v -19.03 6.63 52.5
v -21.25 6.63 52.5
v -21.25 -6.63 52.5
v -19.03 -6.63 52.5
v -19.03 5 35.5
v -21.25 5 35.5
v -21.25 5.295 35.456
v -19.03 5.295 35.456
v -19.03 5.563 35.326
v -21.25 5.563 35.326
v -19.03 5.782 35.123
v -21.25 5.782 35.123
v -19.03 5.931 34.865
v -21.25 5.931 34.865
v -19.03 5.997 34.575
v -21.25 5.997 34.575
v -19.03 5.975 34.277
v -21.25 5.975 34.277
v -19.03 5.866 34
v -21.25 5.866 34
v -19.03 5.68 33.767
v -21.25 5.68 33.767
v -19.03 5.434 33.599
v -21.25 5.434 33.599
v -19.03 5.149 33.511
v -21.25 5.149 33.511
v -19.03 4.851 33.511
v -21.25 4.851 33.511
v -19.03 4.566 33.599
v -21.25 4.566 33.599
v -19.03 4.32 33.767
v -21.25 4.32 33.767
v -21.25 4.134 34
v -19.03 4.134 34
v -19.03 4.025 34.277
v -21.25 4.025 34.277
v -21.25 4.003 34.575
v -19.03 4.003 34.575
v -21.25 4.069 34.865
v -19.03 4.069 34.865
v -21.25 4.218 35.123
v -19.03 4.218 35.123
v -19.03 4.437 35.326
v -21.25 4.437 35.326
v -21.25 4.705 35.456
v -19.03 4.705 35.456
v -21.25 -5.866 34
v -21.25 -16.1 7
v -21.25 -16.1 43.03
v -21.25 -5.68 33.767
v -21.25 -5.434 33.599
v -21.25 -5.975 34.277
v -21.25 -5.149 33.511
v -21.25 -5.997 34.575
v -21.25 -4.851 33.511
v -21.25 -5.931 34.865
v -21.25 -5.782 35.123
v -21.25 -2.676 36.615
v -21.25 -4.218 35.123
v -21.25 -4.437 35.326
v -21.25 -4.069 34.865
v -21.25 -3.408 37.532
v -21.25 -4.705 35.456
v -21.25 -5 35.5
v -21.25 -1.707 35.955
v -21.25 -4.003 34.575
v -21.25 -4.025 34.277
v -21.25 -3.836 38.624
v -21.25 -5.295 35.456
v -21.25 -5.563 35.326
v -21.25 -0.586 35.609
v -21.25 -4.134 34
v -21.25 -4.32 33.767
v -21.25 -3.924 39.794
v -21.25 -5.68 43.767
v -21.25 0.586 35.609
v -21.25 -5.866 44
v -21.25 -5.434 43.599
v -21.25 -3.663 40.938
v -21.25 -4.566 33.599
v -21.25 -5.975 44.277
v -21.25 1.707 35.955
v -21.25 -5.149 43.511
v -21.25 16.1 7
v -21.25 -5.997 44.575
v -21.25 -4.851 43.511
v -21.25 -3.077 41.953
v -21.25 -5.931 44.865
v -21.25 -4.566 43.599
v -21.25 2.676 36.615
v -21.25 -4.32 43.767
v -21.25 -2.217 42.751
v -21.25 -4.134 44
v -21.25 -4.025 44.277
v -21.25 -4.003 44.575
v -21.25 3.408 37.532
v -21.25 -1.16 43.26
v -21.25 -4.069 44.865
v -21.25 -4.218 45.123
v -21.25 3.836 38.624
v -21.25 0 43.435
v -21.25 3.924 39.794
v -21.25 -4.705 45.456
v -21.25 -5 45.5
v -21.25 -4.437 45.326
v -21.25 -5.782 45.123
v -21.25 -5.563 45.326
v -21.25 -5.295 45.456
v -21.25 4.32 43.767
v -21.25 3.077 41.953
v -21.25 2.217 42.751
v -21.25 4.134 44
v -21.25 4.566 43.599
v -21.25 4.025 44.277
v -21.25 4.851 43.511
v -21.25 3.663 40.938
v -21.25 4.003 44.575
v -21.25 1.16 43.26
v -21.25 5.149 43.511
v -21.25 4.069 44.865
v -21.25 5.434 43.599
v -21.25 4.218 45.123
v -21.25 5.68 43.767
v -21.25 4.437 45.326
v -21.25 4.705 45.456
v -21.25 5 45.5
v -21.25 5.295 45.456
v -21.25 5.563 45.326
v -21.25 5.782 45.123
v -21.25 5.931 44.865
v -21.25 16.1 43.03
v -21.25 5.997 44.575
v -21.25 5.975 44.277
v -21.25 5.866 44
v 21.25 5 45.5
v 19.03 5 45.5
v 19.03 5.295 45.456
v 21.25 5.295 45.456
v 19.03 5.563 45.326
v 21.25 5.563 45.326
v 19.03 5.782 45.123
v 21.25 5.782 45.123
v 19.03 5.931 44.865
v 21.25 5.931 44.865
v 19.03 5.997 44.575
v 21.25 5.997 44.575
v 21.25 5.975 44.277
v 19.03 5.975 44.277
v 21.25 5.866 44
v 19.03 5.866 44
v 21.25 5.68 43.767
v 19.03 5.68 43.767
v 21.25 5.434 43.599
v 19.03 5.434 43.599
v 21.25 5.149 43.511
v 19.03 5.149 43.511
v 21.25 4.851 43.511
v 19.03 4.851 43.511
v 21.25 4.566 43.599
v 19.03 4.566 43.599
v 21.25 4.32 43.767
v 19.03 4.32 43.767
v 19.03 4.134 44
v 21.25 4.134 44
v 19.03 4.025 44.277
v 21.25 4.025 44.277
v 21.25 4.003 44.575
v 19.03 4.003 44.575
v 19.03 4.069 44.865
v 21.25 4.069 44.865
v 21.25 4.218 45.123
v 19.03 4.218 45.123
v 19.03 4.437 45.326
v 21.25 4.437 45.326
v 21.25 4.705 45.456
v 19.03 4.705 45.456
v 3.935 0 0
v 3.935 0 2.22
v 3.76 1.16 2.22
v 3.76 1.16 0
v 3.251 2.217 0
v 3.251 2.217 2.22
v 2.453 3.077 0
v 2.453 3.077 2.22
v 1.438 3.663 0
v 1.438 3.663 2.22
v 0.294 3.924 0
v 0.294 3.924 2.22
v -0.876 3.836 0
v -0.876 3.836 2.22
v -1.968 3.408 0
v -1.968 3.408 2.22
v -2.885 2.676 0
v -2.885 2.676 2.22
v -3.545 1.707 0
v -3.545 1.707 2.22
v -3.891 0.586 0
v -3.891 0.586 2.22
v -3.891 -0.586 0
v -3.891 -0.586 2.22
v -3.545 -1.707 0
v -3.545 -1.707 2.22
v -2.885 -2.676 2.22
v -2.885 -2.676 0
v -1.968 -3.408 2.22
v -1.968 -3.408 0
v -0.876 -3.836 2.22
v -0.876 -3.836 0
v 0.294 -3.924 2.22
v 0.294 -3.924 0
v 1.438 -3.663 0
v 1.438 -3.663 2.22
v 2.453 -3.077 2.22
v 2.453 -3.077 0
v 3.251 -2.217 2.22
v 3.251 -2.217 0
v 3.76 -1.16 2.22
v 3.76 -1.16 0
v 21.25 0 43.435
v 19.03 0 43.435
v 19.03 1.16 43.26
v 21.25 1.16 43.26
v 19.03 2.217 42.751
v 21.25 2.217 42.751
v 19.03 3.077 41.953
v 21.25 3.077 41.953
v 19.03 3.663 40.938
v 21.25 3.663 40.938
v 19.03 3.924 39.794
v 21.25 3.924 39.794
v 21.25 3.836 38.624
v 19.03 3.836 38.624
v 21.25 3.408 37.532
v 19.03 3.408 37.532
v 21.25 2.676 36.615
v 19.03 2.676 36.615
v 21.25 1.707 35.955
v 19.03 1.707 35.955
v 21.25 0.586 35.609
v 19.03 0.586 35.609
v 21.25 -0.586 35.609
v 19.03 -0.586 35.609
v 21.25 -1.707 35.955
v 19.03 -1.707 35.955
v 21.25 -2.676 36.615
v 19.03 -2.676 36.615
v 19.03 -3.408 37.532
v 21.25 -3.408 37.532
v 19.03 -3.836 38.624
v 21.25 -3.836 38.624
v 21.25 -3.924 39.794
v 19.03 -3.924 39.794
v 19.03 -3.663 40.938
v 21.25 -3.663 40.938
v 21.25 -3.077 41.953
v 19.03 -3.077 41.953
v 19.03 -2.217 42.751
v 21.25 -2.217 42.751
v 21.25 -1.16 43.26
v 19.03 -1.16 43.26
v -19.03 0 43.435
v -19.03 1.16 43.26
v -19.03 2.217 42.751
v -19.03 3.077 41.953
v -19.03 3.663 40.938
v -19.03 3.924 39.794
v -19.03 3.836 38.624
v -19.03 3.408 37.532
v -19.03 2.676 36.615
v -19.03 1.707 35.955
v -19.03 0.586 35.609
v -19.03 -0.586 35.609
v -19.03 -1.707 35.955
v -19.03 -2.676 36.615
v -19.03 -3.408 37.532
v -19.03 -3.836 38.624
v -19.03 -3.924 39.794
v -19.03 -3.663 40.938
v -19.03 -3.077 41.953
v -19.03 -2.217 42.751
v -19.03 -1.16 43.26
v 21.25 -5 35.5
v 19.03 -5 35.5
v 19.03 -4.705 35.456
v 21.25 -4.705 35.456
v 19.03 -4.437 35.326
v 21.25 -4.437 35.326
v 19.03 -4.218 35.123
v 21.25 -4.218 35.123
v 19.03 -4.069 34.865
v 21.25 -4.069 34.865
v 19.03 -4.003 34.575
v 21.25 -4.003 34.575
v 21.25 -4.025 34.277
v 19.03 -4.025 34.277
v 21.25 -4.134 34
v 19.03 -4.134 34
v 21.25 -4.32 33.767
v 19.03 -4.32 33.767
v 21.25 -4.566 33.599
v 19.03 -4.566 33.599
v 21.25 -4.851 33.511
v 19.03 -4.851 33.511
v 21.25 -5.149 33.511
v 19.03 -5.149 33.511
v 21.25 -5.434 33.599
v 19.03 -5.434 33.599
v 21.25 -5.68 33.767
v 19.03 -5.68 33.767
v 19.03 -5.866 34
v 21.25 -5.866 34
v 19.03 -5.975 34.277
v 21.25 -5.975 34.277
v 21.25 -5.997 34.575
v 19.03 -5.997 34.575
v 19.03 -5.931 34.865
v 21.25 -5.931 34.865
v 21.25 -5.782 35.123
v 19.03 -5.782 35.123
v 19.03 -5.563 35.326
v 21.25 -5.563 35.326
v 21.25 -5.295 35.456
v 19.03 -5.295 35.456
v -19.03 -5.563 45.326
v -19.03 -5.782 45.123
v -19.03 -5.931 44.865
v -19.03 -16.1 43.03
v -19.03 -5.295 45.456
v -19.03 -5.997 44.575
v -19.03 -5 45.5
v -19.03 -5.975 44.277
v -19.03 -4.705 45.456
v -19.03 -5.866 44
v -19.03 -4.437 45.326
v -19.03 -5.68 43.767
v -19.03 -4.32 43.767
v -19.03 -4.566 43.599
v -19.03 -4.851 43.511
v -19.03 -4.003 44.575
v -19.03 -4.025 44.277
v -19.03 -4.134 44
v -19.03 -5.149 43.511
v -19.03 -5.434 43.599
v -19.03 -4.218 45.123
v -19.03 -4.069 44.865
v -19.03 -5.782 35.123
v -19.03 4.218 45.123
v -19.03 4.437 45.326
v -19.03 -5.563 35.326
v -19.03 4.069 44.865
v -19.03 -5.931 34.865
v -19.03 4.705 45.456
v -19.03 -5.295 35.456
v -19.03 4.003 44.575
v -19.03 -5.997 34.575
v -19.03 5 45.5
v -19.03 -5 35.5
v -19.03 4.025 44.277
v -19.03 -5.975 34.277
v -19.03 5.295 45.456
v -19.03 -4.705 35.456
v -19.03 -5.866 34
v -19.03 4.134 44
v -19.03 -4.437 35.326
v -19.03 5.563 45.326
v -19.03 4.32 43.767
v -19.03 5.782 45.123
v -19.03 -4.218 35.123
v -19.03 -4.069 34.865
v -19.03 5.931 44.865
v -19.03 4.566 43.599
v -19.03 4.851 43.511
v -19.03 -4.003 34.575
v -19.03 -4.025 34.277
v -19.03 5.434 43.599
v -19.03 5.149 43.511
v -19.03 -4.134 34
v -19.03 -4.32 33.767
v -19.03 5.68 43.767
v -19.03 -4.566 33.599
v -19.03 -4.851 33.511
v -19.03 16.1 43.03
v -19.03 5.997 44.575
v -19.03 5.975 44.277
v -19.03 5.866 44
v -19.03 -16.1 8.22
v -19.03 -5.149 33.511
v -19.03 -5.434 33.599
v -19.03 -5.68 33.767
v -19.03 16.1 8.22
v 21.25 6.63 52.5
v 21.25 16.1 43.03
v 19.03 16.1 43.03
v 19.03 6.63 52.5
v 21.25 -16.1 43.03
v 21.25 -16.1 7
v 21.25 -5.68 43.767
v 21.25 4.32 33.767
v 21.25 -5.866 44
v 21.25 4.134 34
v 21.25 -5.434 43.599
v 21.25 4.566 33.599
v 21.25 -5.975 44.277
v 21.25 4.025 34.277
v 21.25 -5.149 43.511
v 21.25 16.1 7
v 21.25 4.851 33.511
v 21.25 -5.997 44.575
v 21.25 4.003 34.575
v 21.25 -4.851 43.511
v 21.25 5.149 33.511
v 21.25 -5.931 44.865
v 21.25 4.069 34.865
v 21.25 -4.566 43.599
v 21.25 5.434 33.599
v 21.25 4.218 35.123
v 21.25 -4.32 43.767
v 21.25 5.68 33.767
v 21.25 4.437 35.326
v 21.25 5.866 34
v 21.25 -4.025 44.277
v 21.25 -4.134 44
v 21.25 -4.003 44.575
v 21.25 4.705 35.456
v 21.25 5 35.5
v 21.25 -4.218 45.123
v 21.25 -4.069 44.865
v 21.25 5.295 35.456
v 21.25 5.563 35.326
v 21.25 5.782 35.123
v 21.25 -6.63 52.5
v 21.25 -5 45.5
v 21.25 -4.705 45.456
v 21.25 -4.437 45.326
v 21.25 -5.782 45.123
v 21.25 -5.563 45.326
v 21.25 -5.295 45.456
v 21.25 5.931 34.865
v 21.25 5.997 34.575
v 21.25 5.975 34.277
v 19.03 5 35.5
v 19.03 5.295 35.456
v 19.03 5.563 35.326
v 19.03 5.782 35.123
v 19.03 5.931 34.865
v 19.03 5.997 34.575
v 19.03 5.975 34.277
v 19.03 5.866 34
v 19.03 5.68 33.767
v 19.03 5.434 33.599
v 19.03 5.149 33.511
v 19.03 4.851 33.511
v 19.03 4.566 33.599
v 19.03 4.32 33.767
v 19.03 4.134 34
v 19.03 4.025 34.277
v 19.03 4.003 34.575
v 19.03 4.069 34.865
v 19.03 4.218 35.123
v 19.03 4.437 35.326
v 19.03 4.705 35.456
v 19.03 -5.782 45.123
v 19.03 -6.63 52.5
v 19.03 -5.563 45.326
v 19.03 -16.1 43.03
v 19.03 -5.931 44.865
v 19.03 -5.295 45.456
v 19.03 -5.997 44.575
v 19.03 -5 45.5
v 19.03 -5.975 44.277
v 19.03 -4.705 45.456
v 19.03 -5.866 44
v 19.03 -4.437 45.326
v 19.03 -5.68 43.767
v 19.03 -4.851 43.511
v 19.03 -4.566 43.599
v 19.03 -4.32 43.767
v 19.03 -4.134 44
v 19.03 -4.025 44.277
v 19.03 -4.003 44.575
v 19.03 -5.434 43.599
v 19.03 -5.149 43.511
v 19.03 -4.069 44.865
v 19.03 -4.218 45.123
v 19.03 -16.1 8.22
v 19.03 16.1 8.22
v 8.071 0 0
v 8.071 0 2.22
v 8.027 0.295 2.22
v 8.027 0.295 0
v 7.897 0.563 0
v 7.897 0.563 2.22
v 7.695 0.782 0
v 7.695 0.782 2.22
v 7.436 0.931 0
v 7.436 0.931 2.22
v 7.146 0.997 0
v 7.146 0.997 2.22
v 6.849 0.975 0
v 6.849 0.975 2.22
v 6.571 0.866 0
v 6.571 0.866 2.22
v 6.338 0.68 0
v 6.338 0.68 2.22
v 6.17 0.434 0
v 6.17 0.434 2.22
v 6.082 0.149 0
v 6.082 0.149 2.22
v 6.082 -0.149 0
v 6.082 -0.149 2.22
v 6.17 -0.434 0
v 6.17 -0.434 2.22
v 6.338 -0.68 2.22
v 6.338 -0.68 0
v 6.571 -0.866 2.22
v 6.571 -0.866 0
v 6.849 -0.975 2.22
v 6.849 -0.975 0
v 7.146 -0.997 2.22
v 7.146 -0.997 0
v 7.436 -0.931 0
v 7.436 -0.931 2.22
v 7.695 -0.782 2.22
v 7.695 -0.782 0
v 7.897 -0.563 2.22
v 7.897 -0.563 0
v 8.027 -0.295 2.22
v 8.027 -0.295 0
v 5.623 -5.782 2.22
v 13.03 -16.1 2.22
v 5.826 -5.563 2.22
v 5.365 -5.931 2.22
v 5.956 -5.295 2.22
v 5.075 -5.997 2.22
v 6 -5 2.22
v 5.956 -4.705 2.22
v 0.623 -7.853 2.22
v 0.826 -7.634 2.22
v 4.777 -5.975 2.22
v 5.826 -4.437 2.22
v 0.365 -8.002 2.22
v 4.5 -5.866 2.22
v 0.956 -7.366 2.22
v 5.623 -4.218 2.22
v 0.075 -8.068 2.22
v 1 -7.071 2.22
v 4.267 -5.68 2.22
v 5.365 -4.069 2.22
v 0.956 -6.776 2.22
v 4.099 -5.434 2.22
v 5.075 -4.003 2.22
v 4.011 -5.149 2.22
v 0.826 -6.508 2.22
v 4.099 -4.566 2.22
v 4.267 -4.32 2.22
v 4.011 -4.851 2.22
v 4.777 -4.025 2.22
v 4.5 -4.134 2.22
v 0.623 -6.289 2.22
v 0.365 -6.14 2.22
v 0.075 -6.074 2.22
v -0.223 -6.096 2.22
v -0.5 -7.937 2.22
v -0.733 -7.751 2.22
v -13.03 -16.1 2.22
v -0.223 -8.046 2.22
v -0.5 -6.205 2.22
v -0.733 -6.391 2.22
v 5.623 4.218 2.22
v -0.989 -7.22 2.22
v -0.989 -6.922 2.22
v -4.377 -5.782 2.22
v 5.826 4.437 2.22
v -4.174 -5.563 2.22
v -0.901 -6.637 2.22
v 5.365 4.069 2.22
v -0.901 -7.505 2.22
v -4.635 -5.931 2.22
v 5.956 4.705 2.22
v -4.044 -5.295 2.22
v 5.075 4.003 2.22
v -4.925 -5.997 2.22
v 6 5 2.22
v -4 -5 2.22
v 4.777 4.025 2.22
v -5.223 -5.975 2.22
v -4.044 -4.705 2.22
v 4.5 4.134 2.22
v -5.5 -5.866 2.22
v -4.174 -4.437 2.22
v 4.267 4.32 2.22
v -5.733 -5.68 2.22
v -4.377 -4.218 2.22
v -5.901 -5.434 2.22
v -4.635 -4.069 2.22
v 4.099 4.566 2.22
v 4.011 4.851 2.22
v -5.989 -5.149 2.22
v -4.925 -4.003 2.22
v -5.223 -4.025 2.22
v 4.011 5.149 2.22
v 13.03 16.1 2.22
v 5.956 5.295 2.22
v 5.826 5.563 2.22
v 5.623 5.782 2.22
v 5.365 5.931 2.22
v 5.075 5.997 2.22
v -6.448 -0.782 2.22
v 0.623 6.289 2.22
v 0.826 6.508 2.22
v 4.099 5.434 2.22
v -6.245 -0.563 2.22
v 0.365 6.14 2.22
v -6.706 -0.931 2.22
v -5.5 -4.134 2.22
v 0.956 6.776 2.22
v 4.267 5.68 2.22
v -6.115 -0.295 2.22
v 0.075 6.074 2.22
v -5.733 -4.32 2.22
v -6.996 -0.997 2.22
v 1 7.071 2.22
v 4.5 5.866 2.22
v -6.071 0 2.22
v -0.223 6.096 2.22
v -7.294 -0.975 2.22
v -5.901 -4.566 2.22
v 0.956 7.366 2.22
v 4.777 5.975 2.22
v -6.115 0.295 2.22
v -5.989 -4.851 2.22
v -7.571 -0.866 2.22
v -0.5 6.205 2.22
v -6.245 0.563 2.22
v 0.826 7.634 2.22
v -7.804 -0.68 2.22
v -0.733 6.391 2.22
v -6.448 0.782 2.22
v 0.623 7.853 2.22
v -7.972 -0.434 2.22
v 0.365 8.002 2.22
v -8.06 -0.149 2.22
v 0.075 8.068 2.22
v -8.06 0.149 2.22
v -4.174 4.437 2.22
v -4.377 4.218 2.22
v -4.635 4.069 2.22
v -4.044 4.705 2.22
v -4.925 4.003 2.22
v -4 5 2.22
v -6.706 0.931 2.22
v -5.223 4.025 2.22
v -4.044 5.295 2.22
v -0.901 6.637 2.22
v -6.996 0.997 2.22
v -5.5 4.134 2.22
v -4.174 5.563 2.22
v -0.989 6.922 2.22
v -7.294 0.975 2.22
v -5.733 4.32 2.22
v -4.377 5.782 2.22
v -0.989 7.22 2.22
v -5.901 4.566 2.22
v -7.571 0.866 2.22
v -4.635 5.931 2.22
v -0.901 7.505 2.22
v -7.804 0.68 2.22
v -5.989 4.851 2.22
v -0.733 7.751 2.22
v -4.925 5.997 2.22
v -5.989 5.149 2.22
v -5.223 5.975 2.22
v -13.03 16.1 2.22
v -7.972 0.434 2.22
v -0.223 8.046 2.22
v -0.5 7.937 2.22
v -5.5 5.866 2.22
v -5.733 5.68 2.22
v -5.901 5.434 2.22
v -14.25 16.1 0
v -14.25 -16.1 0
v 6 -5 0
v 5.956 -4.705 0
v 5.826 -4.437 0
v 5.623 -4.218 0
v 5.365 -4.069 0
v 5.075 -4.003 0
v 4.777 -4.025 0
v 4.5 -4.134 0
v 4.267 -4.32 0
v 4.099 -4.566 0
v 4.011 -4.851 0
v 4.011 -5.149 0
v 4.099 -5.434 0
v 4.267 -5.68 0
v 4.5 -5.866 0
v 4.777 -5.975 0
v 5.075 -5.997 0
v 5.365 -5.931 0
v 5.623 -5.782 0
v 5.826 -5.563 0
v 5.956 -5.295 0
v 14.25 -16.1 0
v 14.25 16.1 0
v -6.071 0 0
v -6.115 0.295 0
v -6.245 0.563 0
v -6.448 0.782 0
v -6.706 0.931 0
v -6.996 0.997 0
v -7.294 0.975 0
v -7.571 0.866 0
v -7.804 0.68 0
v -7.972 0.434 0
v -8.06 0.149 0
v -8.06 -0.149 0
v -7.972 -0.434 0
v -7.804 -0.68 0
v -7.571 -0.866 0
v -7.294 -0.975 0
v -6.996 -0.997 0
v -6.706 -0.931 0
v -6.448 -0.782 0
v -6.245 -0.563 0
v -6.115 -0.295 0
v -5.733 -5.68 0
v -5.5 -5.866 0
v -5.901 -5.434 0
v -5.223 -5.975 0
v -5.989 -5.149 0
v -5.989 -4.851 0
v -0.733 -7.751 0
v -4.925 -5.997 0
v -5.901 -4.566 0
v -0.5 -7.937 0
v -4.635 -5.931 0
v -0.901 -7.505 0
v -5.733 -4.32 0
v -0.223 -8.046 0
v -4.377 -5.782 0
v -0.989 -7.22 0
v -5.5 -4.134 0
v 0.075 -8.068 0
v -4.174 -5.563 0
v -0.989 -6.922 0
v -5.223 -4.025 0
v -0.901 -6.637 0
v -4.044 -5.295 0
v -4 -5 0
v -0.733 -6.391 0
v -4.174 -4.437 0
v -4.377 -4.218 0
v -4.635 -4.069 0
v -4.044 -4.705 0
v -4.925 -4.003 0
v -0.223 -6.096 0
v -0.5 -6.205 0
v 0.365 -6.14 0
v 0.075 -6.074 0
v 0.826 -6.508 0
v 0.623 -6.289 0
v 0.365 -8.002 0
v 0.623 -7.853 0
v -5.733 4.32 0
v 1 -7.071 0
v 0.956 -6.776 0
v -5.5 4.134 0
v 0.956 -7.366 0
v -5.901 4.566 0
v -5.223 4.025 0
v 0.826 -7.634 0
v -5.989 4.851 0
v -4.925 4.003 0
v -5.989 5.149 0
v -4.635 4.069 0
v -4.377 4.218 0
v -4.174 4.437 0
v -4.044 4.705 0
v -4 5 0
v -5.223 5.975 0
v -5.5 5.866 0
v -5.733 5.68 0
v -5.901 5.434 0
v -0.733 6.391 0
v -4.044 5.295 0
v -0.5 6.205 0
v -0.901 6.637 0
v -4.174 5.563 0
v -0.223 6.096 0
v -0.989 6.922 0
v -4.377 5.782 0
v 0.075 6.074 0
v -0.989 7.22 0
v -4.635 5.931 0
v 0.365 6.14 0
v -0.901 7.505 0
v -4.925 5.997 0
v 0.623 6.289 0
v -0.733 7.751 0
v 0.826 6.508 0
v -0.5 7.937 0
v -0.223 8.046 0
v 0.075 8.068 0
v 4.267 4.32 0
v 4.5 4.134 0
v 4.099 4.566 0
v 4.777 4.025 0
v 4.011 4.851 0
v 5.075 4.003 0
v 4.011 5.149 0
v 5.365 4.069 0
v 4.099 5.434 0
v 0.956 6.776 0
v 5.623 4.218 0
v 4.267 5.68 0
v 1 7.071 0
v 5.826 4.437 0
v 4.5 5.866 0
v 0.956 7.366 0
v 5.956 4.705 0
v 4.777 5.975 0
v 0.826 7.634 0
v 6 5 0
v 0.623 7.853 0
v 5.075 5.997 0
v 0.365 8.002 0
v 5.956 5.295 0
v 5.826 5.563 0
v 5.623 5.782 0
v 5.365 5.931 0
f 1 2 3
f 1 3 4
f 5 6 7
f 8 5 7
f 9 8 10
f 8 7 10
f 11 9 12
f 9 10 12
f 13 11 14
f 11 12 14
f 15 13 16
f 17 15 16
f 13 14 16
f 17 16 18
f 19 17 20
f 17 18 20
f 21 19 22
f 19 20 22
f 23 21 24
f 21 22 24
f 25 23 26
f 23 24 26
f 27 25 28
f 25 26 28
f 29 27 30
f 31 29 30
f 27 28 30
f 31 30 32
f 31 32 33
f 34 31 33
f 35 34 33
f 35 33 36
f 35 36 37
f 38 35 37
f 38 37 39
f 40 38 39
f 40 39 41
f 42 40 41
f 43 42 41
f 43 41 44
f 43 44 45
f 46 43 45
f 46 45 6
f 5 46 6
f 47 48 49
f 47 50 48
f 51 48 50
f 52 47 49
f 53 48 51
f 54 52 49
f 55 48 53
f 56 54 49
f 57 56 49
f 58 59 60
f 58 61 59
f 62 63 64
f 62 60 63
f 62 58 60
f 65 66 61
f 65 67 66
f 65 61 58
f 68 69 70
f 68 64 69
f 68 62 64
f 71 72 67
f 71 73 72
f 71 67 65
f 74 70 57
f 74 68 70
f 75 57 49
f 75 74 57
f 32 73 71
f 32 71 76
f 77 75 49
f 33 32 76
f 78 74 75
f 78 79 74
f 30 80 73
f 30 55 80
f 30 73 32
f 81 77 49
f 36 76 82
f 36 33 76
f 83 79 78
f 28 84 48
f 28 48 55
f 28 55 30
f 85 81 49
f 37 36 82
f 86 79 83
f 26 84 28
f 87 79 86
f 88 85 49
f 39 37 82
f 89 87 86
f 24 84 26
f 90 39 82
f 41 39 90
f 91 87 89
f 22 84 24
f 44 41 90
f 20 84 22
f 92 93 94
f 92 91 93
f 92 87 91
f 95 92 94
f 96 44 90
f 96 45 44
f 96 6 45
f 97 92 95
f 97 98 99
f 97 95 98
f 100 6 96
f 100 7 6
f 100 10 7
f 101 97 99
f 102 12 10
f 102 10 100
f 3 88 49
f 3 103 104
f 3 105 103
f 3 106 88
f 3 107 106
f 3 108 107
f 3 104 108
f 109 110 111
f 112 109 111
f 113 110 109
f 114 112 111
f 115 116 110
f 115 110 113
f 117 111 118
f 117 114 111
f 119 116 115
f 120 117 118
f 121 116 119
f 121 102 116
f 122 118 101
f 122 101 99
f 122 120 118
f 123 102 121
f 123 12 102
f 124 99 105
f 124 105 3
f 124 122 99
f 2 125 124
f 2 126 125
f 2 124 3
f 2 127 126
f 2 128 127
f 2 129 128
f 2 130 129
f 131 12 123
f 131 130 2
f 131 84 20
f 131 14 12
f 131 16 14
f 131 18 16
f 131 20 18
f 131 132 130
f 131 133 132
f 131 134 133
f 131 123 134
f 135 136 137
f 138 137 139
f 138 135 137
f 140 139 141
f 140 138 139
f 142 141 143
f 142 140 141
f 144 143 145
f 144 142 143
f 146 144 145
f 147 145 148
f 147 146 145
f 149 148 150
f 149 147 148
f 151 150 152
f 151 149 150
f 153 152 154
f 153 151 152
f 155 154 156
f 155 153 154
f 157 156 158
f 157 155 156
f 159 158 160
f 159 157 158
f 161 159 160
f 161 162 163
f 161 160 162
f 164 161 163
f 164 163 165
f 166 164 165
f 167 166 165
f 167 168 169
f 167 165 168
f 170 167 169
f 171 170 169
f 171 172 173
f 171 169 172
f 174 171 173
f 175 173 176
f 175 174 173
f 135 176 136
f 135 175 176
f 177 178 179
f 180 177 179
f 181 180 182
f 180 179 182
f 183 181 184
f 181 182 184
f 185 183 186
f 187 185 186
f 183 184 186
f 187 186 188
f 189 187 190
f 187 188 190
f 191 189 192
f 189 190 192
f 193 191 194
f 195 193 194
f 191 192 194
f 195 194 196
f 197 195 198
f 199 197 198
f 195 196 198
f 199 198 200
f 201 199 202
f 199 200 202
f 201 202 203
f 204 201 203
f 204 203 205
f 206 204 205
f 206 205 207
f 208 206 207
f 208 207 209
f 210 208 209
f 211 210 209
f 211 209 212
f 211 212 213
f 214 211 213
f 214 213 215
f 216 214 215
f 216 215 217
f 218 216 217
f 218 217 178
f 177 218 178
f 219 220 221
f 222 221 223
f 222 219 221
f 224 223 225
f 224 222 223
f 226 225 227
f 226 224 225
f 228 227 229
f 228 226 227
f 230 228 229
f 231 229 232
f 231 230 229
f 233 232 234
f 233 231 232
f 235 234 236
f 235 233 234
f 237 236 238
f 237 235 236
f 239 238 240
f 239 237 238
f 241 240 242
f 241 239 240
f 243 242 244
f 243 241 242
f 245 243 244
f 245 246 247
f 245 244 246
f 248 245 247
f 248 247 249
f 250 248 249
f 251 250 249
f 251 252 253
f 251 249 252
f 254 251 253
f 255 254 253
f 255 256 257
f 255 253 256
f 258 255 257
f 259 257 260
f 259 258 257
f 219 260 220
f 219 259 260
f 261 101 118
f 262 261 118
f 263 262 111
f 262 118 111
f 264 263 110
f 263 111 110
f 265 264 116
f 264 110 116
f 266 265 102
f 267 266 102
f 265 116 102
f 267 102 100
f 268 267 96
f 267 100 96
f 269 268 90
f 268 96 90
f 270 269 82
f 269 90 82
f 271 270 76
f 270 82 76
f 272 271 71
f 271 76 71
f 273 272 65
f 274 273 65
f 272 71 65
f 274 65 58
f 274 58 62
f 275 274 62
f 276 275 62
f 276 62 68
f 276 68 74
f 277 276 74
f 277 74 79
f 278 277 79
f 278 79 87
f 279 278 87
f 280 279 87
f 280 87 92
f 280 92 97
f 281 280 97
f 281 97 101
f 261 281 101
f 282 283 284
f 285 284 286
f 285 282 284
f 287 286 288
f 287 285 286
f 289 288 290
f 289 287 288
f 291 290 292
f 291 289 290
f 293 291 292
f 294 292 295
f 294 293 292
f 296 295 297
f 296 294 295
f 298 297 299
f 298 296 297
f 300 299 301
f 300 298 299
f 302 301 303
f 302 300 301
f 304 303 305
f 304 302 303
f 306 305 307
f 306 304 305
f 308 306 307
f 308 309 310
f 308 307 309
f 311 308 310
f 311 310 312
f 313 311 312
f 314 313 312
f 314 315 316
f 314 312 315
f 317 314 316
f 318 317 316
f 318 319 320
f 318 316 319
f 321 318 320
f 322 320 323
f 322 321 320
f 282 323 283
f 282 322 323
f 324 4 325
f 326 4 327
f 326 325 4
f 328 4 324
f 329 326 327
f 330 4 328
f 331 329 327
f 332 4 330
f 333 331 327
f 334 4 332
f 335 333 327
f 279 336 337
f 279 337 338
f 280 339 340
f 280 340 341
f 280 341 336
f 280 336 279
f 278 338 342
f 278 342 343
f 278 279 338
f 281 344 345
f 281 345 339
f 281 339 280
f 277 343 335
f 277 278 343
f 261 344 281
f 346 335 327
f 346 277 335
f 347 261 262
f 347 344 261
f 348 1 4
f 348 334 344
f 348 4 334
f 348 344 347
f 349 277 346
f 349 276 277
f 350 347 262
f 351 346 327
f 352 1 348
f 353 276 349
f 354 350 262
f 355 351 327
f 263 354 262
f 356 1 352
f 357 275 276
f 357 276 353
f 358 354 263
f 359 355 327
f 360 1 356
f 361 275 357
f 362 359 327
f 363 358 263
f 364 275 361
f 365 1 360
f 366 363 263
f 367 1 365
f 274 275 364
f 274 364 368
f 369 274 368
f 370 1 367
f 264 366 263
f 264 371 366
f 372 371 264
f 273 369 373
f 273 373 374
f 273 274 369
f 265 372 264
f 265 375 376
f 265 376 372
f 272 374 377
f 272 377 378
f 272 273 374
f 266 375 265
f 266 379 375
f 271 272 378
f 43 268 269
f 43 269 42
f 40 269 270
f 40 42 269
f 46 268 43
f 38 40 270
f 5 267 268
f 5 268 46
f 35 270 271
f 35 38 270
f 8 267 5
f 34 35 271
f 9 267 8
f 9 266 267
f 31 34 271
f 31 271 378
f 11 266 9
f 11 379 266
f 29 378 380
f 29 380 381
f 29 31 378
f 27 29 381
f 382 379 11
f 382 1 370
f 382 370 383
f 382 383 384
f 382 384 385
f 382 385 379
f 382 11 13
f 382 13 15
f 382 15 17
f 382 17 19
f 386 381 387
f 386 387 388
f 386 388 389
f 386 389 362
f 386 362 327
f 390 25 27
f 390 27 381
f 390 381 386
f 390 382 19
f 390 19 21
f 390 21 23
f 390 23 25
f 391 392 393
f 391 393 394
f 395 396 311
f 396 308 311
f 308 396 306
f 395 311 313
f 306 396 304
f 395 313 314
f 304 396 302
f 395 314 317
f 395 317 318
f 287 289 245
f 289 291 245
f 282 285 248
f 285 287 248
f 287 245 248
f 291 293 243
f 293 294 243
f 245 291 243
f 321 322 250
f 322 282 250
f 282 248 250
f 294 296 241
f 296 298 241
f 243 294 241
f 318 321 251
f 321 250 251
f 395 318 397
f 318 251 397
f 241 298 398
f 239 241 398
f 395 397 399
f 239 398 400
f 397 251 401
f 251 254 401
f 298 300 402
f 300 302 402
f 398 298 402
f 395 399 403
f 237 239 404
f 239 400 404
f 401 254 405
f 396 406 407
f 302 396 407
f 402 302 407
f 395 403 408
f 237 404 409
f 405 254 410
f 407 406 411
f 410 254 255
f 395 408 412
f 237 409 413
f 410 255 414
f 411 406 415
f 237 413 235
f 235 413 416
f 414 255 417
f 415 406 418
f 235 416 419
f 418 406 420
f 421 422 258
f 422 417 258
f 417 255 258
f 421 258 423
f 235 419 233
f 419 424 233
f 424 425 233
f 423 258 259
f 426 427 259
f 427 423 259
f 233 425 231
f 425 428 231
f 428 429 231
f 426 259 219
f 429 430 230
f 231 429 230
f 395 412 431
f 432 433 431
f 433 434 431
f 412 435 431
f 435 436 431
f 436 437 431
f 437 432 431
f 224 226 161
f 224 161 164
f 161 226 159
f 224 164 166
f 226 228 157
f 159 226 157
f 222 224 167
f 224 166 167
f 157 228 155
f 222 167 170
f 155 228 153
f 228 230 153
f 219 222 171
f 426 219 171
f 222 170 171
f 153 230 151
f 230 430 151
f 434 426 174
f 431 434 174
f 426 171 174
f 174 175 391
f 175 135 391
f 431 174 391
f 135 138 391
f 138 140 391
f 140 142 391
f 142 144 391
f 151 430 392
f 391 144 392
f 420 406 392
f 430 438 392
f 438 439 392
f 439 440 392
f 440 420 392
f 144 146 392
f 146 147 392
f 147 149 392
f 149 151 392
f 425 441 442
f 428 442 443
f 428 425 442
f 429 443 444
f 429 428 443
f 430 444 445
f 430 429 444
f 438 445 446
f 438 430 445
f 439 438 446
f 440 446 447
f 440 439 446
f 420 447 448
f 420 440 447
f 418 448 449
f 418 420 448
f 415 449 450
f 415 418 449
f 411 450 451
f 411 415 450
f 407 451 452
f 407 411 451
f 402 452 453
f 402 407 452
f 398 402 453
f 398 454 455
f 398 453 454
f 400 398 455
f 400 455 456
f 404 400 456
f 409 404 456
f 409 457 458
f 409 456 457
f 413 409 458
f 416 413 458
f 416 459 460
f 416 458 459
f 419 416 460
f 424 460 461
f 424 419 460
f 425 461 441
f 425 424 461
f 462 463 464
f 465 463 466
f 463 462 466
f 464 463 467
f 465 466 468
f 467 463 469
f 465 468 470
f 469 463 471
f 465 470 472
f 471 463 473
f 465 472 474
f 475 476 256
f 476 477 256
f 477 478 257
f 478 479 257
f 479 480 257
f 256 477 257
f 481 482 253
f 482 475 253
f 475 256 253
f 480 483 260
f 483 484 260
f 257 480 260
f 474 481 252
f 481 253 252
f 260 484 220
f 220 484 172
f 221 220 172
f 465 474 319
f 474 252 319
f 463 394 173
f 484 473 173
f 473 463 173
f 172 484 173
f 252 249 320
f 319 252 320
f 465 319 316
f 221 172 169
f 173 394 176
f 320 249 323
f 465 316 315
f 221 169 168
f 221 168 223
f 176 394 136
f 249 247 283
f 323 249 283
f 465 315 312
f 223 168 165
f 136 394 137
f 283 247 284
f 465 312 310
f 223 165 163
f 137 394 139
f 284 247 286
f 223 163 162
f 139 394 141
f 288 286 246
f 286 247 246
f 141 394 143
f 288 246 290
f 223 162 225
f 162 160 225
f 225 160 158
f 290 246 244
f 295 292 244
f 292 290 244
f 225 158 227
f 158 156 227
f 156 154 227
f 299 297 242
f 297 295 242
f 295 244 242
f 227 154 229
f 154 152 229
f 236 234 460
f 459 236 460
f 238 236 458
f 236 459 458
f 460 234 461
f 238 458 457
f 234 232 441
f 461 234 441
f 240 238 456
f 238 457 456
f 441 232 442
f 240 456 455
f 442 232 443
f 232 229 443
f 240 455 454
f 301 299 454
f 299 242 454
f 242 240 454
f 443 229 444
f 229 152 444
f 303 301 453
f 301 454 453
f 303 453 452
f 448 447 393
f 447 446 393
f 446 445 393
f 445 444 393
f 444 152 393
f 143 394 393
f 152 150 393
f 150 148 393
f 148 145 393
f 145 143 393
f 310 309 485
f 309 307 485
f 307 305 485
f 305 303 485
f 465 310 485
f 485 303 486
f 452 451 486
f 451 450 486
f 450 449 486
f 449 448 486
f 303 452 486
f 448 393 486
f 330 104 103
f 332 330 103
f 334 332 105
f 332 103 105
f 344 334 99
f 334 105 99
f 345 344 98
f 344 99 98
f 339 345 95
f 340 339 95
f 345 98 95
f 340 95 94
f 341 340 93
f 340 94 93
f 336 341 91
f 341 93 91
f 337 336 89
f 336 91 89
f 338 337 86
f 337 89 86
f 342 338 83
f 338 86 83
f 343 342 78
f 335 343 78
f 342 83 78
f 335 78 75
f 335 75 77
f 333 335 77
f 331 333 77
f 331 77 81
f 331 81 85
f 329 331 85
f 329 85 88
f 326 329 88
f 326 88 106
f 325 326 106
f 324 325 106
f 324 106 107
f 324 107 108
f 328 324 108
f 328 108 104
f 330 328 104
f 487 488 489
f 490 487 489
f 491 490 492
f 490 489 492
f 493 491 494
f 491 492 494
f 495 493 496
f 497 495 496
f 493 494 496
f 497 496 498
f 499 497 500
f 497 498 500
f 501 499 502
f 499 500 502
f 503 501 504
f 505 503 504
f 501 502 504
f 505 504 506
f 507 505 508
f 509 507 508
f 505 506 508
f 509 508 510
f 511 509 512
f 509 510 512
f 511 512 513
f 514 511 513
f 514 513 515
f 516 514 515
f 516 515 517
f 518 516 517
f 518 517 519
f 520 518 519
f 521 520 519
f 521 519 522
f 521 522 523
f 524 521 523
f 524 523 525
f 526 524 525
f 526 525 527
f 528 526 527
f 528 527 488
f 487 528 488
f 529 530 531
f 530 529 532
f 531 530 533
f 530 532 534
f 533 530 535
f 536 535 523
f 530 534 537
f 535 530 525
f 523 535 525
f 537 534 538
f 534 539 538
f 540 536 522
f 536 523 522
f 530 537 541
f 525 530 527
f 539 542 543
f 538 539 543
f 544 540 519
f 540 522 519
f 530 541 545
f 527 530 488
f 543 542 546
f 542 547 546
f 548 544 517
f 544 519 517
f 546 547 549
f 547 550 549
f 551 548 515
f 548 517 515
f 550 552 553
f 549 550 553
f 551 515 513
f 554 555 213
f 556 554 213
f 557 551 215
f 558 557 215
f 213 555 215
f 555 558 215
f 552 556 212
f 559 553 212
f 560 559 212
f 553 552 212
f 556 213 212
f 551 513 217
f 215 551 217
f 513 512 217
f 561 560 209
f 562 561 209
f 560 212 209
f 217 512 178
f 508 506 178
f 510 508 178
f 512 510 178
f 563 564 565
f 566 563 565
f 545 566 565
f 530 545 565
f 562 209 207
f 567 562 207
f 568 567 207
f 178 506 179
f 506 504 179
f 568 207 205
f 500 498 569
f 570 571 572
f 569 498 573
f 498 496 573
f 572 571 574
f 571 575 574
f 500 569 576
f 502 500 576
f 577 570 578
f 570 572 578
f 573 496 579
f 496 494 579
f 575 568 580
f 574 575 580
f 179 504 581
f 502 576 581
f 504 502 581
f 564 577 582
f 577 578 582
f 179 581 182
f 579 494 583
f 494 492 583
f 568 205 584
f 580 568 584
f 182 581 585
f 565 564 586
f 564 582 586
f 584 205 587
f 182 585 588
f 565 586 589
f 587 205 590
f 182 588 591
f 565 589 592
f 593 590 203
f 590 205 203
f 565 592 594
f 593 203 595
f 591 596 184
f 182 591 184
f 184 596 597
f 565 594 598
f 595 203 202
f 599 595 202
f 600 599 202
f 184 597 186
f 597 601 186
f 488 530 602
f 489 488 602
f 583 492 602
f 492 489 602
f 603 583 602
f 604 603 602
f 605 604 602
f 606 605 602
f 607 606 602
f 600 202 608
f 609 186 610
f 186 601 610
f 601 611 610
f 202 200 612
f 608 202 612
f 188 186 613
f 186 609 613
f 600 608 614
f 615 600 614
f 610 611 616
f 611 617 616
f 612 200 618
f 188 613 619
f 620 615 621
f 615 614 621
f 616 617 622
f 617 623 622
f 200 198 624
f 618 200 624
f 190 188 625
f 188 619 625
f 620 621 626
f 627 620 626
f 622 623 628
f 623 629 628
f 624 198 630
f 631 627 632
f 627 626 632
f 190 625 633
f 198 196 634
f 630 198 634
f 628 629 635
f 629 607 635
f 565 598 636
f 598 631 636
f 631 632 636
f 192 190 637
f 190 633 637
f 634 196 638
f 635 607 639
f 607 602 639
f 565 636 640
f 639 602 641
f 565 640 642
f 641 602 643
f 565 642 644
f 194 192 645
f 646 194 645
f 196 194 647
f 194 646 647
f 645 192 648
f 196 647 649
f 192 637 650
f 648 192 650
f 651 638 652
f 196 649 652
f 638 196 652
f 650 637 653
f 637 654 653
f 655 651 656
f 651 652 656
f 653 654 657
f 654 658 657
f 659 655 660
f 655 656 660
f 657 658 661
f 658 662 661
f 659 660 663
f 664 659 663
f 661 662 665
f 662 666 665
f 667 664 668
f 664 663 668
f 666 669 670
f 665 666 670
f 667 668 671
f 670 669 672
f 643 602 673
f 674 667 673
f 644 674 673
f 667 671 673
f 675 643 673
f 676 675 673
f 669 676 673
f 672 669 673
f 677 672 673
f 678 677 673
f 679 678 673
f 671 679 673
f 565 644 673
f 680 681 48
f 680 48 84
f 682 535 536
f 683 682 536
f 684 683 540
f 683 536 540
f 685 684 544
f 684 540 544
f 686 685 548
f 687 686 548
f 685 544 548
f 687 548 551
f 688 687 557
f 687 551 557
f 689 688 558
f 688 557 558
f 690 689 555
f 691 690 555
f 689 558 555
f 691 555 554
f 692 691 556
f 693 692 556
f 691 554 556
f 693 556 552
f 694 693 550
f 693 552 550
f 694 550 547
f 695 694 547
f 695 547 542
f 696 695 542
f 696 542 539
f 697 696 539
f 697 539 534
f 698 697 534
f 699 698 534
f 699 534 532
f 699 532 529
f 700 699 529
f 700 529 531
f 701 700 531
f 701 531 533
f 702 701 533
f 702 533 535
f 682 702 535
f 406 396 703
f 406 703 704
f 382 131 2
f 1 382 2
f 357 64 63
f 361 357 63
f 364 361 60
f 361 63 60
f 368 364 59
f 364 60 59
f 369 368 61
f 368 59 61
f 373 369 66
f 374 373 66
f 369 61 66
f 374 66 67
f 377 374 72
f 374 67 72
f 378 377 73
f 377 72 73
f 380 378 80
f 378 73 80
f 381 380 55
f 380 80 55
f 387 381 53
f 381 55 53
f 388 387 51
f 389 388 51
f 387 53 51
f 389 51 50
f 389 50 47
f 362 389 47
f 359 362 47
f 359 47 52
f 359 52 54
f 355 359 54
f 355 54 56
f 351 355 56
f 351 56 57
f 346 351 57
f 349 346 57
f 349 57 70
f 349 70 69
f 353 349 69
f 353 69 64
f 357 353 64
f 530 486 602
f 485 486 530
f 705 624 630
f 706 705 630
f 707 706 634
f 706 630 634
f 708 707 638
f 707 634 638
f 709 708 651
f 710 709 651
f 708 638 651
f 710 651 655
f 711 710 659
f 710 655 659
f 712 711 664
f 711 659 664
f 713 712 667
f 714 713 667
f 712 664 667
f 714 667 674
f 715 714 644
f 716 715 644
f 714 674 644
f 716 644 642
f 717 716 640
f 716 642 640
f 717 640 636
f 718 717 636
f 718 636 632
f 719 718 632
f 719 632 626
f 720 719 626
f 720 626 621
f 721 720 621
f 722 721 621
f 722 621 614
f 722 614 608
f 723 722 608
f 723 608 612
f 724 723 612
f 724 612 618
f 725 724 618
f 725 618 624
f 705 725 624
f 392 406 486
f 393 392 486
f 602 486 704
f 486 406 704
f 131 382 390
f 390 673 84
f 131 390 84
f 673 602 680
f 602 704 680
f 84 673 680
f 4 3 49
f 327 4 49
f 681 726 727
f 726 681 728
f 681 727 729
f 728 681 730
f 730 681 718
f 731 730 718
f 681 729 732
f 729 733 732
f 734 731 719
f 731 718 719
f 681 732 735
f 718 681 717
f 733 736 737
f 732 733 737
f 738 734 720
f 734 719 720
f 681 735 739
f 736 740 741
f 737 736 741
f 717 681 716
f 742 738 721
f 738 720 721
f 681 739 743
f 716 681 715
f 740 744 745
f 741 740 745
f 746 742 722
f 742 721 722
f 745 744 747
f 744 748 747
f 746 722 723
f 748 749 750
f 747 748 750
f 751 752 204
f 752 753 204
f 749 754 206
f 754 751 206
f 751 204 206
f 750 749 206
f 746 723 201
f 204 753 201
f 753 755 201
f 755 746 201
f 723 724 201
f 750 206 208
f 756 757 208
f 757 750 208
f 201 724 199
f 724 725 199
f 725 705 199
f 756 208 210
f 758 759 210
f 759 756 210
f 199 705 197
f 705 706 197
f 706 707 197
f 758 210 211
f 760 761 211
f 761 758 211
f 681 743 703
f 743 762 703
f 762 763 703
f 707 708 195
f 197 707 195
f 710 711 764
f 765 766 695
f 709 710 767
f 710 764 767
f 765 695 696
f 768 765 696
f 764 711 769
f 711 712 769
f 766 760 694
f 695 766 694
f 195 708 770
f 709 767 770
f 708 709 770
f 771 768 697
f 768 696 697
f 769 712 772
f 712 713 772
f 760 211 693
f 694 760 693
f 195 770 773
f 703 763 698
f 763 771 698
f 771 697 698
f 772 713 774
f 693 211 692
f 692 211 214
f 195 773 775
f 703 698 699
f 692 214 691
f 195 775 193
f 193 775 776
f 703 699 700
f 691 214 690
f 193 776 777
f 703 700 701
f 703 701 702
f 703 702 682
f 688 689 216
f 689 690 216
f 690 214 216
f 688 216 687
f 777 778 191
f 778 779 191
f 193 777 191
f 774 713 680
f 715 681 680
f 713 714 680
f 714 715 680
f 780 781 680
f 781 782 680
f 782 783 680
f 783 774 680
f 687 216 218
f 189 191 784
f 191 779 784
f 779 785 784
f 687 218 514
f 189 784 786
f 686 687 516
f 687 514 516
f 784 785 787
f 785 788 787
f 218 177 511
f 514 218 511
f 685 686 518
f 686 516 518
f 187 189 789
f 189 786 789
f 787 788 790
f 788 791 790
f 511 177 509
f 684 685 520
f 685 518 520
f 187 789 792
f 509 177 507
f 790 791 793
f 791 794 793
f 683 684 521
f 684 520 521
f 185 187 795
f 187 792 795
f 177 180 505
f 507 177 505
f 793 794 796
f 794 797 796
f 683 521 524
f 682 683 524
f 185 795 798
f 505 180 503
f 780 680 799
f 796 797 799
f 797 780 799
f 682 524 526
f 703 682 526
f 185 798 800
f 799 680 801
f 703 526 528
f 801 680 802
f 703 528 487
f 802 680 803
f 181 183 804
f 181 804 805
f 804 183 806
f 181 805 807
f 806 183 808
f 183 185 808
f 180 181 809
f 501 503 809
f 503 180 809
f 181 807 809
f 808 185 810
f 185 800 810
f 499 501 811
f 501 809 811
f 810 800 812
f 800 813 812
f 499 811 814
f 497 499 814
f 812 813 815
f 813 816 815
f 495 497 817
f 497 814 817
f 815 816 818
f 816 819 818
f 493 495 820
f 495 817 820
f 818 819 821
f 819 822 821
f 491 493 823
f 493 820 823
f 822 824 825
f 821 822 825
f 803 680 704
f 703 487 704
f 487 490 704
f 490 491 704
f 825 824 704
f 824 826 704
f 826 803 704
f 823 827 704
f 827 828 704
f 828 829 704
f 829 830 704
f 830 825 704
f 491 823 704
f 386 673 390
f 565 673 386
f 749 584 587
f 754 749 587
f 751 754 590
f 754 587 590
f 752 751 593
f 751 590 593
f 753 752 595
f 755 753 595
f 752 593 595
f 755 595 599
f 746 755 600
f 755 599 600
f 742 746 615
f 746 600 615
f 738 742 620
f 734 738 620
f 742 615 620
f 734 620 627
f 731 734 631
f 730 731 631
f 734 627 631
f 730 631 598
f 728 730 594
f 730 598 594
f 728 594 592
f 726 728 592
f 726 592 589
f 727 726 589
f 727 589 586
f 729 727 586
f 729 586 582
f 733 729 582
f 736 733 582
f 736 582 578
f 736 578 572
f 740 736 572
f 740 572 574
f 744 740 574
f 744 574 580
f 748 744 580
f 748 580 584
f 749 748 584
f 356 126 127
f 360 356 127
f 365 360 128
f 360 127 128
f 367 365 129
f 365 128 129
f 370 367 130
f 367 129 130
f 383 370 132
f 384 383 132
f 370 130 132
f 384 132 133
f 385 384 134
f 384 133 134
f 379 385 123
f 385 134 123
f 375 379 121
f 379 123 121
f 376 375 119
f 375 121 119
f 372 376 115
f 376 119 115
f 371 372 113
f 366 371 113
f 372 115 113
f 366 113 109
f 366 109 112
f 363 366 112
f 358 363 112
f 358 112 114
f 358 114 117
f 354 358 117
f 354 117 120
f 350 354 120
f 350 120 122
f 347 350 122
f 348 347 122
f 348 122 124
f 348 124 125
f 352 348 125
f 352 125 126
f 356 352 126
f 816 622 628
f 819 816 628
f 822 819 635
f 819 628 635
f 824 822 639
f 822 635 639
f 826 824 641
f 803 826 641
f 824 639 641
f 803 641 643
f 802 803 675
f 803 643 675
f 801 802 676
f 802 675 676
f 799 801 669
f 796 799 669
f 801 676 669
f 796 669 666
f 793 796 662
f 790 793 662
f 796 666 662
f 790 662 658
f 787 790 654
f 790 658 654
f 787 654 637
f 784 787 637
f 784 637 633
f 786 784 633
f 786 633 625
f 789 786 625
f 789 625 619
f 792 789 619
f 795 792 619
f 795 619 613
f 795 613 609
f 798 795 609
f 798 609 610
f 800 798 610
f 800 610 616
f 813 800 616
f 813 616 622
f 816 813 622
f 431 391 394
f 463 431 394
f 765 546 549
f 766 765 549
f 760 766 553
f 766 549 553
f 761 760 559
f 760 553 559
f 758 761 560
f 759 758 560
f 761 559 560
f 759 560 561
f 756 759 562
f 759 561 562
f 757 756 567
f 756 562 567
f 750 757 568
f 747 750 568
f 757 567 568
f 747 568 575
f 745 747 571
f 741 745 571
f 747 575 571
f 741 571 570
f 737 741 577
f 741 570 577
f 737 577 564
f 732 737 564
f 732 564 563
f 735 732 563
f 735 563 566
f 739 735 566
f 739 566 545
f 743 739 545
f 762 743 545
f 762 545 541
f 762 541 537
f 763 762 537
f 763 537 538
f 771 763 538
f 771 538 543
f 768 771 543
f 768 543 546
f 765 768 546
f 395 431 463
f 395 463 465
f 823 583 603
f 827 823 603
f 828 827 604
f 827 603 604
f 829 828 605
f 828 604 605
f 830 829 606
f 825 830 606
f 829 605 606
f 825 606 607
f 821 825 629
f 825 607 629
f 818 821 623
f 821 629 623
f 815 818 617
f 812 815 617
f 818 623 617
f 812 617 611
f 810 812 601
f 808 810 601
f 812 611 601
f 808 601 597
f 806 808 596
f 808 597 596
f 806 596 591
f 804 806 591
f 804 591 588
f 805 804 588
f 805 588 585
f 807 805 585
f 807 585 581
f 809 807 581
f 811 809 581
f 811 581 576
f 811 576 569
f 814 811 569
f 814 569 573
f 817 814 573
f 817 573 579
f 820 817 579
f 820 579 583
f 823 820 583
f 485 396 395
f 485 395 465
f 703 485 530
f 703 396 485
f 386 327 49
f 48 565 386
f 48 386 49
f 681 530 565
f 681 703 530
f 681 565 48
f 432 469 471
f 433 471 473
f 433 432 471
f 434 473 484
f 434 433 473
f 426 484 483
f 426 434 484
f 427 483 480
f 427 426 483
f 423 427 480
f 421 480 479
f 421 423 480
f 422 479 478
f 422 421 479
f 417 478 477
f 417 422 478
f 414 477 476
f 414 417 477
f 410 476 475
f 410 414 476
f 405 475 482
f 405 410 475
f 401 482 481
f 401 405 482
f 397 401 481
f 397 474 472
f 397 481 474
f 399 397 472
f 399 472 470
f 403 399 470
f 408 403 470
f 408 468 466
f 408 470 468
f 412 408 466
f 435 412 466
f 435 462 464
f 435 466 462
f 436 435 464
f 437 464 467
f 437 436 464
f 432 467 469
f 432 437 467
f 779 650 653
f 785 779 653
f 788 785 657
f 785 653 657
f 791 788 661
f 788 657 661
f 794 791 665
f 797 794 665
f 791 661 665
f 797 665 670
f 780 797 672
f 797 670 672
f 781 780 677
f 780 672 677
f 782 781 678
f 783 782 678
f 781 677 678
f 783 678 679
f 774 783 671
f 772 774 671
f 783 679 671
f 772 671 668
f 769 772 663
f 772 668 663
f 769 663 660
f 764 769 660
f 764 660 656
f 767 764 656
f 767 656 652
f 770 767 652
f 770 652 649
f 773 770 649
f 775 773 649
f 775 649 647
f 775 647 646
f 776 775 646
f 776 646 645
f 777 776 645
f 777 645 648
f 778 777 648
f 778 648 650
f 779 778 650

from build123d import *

# Parameters (mm, degrees)
BOSS_EXTRUDE1_DEPTH = 16.1
CUT_EXTRUDE1_DEPTH  = 32.2
SKETCH3_R           = 3.935
SKETCH3_R_2         = 1
CUT_EXTRUDE2_DEPTH  = 32.2
SKETCH4_R           = 3.935
SKETCH4_R_2         = 1
CUT_EXTRUDE3_DEPTH  = 32.2
CHAMFER1_SIZE       = 6
CHAMFER2_SIZE       = 7


with BuildPart() as part:
    # Sketch1 → Boss-Extrude1 (new, symmetric)
    with BuildSketch(Plane(origin=(0, 0, 0), x_dir=(1, 0, 0), z_dir=(0, 1, 0))):
        Polygon((0, 0), (-21.25, 0), (-21.25, -52.5), (-19.03, -52.5), (-19.03, -2.22), (0, -2.22), align=None)
    boss_extrude1 = extrude(amount=BOSS_EXTRUDE1_DEPTH, both=True)

    # Sketch2 → Cut-Extrude1 (cut)
    with BuildSketch(Plane.ZY.offset(21.25)):
        Polygon((43.03, 16.1), (52.5, 6.63), (52.5, 16.1), align=None)
        Polygon((52.5, -6.63), (43.03, -16.1), (52.5, -16.1), align=None)
    cut_extrude1 = extrude(amount=-CUT_EXTRUDE1_DEPTH, mode=Mode.SUBTRACT)

    # Sketch3 → Cut-Extrude2 (cut)
    with BuildSketch(Plane.ZY.offset(21.25)):
        with Locations((39.5, 0)):
            Circle(SKETCH3_R)
        with Locations((34.5, 5)):
            Circle(SKETCH3_R_2)
        with Locations((44.5, 5)):
            Circle(SKETCH3_R_2)
        with Locations((44.5, -5)):
            Circle(SKETCH3_R_2)
        with Locations((34.5, -5)):
            Circle(SKETCH3_R_2)
    cut_extrude2 = extrude(amount=-CUT_EXTRUDE2_DEPTH, mode=Mode.SUBTRACT)

    # Mirror1: Boss-Extrude1, Cut-Extrude1, Cut-Extrude2 across plane
    add(boss_extrude1.mirror(Plane(origin=(0, 16.1, 2.22), x_dir=(0, 0, 1), z_dir=(-1, 0, 0))))
    add(cut_extrude1.mirror(Plane(origin=(0, 16.1, 2.22), x_dir=(0, 0, 1), z_dir=(-1, 0, 0))), mode=Mode.SUBTRACT)
    add(cut_extrude2.mirror(Plane(origin=(0, 16.1, 2.22), x_dir=(0, 0, 1), z_dir=(-1, 0, 0))), mode=Mode.SUBTRACT)

    # Sketch4 → Cut-Extrude3 (cut)
    with BuildSketch(Plane.XY.offset(2.22)):
        Circle(SKETCH4_R)
        with Locations((-5, 5)):
            Circle(SKETCH4_R_2)
        with Locations((5, 5)):
            Circle(SKETCH4_R_2)
        with Locations((5, -5)):
            Circle(SKETCH4_R_2)
        with Locations((-5, -5)):
            Circle(SKETCH4_R_2)
        with Locations((-7.071067812, 0)):
            Circle(SKETCH4_R_2)
        with Locations((0, 7.071067812)):
            Circle(SKETCH4_R_2)
        with Locations((7.071067812, 0)):
            Circle(SKETCH4_R_2)
        with Locations((0, -7.071067812)):
            Circle(SKETCH4_R_2)
    extrude(amount=-CUT_EXTRUDE3_DEPTH, mode=Mode.SUBTRACT)

    # Chamfer1
    chamfer1_edges = [part.edges().sort_by_distance(p)[0] for p in [
        (-19.03, 0, 2.22),
        (19.03, 0, 2.22),
    ]]
    chamfer(chamfer1_edges, length=CHAMFER1_SIZE)

    # Chamfer2
    chamfer2_edges = [part.edges().sort_by_distance(p)[0] for p in [
        (-21.25, 0, 0),
        (21.25, 0, 0),
    ]]
    chamfer(chamfer2_edges, length=CHAMFER2_SIZE)


solid = part.part
